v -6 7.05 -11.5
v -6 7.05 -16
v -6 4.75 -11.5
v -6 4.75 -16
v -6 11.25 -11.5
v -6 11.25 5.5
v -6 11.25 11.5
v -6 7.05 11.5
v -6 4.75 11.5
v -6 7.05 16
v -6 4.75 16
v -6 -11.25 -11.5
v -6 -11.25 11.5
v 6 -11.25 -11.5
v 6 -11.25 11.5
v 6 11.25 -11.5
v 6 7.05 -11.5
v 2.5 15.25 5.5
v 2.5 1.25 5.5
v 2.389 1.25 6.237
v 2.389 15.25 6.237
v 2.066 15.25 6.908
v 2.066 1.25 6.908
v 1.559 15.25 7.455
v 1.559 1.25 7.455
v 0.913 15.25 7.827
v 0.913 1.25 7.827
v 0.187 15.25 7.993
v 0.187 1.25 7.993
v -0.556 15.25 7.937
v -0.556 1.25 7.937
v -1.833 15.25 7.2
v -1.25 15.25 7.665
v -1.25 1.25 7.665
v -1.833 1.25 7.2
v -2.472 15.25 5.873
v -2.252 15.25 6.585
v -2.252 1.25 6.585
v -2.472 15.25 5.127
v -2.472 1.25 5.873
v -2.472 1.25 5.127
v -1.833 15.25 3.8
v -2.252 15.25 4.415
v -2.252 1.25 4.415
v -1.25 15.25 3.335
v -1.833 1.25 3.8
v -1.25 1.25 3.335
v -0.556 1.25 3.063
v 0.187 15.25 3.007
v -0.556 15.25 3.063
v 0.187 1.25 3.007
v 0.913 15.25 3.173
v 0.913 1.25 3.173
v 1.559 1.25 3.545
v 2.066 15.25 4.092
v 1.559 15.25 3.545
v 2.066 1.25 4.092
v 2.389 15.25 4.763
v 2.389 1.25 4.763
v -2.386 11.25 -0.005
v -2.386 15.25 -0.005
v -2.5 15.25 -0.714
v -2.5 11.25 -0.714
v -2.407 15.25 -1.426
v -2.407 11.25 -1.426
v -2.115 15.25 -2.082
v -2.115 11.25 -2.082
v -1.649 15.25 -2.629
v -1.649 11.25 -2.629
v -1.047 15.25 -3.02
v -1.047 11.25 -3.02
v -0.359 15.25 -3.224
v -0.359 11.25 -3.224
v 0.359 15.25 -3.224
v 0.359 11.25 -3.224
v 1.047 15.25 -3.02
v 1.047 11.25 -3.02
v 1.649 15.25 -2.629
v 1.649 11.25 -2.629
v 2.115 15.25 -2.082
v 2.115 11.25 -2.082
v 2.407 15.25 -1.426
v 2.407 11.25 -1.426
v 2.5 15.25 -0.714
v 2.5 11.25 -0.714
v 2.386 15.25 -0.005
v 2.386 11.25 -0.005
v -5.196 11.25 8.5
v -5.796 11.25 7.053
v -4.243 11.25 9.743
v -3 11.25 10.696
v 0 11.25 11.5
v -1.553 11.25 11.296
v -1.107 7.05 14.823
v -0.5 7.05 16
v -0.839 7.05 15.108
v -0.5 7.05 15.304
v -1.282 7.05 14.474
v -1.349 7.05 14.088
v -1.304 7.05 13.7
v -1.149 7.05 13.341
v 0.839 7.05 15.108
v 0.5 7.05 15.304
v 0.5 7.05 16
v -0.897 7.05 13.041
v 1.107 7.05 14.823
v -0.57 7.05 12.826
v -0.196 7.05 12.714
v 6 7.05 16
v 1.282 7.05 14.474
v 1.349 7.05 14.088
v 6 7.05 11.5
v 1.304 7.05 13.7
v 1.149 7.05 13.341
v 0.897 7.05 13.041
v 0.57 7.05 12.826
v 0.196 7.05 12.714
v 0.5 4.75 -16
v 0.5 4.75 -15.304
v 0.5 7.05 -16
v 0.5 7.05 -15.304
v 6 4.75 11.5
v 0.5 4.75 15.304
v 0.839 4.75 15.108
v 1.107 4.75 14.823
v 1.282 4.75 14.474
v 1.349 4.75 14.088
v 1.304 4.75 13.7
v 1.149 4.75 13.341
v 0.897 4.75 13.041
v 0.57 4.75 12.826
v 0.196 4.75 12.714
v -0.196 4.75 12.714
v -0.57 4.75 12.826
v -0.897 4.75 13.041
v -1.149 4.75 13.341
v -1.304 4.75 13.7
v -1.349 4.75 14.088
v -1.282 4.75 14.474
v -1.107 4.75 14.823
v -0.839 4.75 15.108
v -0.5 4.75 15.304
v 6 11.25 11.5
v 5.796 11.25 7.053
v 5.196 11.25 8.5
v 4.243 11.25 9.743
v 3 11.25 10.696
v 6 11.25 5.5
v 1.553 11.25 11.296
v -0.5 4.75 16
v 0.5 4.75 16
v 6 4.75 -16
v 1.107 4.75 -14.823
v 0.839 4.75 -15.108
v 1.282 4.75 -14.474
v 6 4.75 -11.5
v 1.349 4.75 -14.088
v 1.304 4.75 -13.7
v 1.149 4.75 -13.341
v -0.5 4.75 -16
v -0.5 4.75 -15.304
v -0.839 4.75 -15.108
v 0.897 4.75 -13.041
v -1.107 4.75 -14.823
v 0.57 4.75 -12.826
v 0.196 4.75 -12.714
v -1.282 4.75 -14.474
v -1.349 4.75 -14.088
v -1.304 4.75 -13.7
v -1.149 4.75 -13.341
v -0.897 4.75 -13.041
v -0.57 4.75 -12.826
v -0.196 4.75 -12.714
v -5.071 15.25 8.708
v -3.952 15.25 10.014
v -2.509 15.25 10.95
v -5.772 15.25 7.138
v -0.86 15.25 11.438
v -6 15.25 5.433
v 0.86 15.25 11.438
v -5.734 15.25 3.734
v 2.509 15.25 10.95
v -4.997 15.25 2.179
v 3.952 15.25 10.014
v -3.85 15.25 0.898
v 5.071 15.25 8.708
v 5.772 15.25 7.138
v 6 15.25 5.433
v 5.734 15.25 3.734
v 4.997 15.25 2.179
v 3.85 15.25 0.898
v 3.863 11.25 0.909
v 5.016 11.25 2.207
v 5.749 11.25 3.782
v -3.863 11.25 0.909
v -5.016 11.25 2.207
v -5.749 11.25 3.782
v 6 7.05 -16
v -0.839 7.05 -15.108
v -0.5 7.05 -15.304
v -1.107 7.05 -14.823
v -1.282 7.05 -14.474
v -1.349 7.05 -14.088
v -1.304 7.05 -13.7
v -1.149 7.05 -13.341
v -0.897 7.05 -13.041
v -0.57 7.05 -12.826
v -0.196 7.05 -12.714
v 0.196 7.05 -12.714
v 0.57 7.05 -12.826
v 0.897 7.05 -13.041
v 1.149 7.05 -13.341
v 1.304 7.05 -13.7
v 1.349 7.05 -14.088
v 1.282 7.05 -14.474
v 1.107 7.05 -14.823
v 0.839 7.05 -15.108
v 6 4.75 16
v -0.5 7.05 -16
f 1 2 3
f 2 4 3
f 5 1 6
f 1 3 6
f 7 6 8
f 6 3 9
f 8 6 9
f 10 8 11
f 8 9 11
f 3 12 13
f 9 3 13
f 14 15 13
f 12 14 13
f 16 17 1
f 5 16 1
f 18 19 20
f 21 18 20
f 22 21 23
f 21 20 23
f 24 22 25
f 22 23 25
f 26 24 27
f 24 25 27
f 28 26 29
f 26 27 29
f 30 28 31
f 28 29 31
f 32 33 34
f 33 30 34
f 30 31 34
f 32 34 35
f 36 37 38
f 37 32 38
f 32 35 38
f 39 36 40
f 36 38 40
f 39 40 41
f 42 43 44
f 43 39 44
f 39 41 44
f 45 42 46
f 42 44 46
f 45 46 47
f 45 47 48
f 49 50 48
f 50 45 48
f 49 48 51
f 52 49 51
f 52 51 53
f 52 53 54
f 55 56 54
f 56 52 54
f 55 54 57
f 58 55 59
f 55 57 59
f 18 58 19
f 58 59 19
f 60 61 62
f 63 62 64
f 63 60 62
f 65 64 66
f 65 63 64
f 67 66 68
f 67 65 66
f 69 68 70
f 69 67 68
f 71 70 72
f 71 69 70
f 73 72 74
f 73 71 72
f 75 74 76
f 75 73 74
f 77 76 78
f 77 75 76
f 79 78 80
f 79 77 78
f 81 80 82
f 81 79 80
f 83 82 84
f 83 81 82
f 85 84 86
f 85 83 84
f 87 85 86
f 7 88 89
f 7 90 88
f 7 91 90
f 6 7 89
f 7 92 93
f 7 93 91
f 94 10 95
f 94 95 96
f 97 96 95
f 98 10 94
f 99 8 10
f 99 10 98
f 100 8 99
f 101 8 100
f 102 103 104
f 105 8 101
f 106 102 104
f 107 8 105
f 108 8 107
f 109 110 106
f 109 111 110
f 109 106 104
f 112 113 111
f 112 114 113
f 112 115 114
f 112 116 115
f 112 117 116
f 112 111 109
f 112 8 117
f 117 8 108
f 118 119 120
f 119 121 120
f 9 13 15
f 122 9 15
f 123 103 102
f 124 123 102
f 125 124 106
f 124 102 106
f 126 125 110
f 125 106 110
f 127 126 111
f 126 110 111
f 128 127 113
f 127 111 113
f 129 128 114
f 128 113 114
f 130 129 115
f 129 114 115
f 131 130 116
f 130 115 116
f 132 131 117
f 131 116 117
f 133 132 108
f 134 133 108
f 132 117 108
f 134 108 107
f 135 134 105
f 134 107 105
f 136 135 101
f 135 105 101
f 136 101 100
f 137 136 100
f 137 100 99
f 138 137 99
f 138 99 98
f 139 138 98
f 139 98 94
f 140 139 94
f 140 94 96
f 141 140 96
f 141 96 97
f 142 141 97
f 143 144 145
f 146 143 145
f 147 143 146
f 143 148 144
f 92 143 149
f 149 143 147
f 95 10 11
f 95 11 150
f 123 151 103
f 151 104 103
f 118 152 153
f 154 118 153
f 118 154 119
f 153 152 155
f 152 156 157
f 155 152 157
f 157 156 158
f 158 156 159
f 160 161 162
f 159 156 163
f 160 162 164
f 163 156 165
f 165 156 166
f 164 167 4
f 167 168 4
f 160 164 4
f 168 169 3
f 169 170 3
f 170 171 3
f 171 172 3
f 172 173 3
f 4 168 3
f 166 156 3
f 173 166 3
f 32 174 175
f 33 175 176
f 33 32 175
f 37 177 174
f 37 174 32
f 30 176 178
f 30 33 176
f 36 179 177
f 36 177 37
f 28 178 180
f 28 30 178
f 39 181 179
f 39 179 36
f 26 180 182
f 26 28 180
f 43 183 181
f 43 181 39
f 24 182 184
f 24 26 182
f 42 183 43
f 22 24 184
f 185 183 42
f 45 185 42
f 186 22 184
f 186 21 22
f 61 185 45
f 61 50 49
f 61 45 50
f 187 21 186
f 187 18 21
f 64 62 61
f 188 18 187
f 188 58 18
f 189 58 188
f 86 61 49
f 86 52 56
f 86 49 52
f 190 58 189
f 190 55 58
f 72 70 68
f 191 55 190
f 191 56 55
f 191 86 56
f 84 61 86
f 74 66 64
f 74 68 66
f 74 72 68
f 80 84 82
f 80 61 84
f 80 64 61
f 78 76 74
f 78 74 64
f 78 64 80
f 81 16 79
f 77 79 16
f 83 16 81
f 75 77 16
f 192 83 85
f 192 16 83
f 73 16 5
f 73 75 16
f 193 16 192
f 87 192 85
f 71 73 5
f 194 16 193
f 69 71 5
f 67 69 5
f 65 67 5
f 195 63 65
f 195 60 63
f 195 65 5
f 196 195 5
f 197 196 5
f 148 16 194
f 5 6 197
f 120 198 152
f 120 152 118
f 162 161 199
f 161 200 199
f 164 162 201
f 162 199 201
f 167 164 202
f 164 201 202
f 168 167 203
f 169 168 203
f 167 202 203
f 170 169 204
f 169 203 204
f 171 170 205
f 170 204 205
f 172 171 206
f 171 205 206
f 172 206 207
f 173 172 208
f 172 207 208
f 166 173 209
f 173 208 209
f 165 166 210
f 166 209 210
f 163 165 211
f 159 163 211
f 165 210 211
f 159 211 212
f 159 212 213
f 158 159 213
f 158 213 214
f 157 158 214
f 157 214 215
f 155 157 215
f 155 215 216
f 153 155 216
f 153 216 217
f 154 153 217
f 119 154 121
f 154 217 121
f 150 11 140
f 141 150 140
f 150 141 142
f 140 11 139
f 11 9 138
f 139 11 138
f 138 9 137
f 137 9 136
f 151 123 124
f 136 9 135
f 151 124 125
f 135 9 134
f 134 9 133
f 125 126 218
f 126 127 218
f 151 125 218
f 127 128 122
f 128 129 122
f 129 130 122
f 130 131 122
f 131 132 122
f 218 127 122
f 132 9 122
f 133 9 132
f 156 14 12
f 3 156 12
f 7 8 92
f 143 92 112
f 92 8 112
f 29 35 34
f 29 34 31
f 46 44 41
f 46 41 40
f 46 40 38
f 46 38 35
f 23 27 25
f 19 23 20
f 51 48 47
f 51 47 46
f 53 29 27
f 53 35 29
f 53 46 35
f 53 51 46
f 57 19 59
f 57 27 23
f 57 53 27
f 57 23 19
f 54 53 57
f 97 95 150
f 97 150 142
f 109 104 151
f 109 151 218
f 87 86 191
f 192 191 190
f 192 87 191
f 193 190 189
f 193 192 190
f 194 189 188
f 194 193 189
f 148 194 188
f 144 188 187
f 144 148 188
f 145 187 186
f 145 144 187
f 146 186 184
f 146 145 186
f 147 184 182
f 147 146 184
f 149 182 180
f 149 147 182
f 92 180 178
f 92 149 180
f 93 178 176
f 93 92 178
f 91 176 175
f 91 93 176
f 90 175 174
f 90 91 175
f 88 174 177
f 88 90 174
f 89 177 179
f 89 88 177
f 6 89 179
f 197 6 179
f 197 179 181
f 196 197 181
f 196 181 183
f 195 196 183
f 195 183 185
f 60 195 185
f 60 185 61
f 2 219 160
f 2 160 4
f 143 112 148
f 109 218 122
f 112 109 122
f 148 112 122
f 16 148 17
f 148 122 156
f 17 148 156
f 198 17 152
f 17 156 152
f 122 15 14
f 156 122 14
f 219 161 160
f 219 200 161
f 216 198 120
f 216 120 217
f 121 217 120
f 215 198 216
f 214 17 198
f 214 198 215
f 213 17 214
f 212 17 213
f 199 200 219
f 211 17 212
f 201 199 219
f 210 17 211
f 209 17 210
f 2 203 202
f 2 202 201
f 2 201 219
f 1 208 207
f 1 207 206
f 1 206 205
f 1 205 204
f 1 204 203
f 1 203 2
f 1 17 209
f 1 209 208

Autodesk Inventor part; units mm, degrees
ref_plane "YZ Plane" through (0, 0, 0) normal (1, 0, 0) x (0, 1, 0)
ref_plane "XZ Plane" through (0, 0, 0) normal (0, 1, 0) x (-1, 0, 0)
ref_plane "XY Plane" through (0, 0, 0) normal (0, 0, 1) x (1, 0, 0)
sketch "Sketch1" plane through (0, 0, 0) normal (0, 1, 0) x (-1, 0, 0)
  line L0 (6, 11.5) -> (-6, 11.5)
  line L1 (-6, 11.5) -> (-6, -11.5)
  line L2 (-6, -11.5) -> (6, -11.5)
  line L3 (6, -11.5) -> (6, 11.5)
  line L4 (6, 11.5) -> (-6, -11.5) construction
  line L5 (-6, 11.5) -> (6, -11.5) construction
  point P0 (0, 0)
  dimension "d0" = 12
  dimension "d1" = 23
extrude "Extrusion1" add sketch "Sketch1" along normal mid plane 22.5
sketch "Sketch2" plane through (-6, 11.25, 11.5) normal (0, 0, 1) x (1, 0, 0)
  line L0 (12, -22.5) -> (0, -22.5) projected
  line L1 (0, -22.5) -> (0, 0) projected
  line L2 (0, -6.5) -> (12, -6.5)
  line L3 (12, -22.5) -> (12, 0) projected
  line L4 (0, -4.2) -> (12, -4.2)
  line L5 (0, -4.2) -> (0, -6.5)
  line L6 (12, -4.2) -> (12, -6.5)
  point P0 (6, -11.25)
  dimension "d4" = 16
  dimension "d5" = 2.3
extrude "Extrusion2" add sketch "Sketch2" along normal blind 4.5 contours L2 L1 L4 L3
mirror "Mirror1" about plane through (0, 0, 0) normal (0, 0, 1) of "Extrusion2"
sketch "Sketch3" plane through (-6, 7.05, 11.5) normal (0, 1, 0) x (1, 0, 0)
  arc A0 (6.5, -3.804) -> (5.5, -3.804) centre (6, -2.55) ccw
  line L0 (0, 0) -> (0, -4.5) projected
  line L1 (12, -4.5) -> (0, -4.5) construction
  line L2 (6, -2.55) -> (6, -4.5) construction
  line L3 (0, -4.5) -> (12, -4.5) construction
  line L4 (6, -2.55) -> (6, -1.2) construction
  line L5 (5.5, -4.5) -> (5.5, -3.804)
  line L6 (6.5, -4.5) -> (6.5, -3.804)
  line L7 (6.5, -4.5) -> (5.5, -4.5)
  point P0 (6, 11.5)
  point P1 (5.5, -2.8875)
  point P2 (6.5, -2.8875)
  dimension "d8" = 2.7
  dimension "d9" = 6
  dimension "d11" = 0.5
  dimension "d14" = 1.95
extrude "Extrusion3" cut sketch "Sketch3" against normal blind 4.5
mirror "Mirror2" about plane through (0, 0, 0) normal (0, 0, 1) of "Extrusion3"
sketch "Sketch4" plane through (0, 11.25, 0) normal (0, 1, 0) x (1, 0, 0)
  circle A0 centre (0, -5.5) radius 6
  line L0 (-6, 11.5) -> (-6, -11.5) projected
  line L1 (-6, -11.5) -> (6, -11.5) projected
  circle A1 centre (0, -5.5) radius 2.5
  point P0 (0, 0)
  dimension "d17" = 5
extrude "Extrusion4" add sketch "Sketch4" along normal blind 4 contours A0
sketch "Sketch5" plane through (0, 11.25, 0) normal (0, 1, 0) x (1, 0, 0)
  circle A0 centre (0, 0.75) radius 2.5
  circle A1 centre (0, -5.5) radius 2.5 projected
  point P0 (0, 0)
  dimension "d20" = 5
  dimension "d21" = 6.25
extrude "Extrusion5" add sketch "Sketch5" along normal blind 4 contours A0
sketch "Sketch6" plane through (0, 11.25, 5.5) normal (0, 1, 0) x (1, 0, 0)
  circle A0 centre (0, 0) radius 2.5 projected
  point P0 (0, 5.5)
extrude "Extrusion6" cut sketch "Sketch6" against normal blind 10
properties part number "Servo body"
